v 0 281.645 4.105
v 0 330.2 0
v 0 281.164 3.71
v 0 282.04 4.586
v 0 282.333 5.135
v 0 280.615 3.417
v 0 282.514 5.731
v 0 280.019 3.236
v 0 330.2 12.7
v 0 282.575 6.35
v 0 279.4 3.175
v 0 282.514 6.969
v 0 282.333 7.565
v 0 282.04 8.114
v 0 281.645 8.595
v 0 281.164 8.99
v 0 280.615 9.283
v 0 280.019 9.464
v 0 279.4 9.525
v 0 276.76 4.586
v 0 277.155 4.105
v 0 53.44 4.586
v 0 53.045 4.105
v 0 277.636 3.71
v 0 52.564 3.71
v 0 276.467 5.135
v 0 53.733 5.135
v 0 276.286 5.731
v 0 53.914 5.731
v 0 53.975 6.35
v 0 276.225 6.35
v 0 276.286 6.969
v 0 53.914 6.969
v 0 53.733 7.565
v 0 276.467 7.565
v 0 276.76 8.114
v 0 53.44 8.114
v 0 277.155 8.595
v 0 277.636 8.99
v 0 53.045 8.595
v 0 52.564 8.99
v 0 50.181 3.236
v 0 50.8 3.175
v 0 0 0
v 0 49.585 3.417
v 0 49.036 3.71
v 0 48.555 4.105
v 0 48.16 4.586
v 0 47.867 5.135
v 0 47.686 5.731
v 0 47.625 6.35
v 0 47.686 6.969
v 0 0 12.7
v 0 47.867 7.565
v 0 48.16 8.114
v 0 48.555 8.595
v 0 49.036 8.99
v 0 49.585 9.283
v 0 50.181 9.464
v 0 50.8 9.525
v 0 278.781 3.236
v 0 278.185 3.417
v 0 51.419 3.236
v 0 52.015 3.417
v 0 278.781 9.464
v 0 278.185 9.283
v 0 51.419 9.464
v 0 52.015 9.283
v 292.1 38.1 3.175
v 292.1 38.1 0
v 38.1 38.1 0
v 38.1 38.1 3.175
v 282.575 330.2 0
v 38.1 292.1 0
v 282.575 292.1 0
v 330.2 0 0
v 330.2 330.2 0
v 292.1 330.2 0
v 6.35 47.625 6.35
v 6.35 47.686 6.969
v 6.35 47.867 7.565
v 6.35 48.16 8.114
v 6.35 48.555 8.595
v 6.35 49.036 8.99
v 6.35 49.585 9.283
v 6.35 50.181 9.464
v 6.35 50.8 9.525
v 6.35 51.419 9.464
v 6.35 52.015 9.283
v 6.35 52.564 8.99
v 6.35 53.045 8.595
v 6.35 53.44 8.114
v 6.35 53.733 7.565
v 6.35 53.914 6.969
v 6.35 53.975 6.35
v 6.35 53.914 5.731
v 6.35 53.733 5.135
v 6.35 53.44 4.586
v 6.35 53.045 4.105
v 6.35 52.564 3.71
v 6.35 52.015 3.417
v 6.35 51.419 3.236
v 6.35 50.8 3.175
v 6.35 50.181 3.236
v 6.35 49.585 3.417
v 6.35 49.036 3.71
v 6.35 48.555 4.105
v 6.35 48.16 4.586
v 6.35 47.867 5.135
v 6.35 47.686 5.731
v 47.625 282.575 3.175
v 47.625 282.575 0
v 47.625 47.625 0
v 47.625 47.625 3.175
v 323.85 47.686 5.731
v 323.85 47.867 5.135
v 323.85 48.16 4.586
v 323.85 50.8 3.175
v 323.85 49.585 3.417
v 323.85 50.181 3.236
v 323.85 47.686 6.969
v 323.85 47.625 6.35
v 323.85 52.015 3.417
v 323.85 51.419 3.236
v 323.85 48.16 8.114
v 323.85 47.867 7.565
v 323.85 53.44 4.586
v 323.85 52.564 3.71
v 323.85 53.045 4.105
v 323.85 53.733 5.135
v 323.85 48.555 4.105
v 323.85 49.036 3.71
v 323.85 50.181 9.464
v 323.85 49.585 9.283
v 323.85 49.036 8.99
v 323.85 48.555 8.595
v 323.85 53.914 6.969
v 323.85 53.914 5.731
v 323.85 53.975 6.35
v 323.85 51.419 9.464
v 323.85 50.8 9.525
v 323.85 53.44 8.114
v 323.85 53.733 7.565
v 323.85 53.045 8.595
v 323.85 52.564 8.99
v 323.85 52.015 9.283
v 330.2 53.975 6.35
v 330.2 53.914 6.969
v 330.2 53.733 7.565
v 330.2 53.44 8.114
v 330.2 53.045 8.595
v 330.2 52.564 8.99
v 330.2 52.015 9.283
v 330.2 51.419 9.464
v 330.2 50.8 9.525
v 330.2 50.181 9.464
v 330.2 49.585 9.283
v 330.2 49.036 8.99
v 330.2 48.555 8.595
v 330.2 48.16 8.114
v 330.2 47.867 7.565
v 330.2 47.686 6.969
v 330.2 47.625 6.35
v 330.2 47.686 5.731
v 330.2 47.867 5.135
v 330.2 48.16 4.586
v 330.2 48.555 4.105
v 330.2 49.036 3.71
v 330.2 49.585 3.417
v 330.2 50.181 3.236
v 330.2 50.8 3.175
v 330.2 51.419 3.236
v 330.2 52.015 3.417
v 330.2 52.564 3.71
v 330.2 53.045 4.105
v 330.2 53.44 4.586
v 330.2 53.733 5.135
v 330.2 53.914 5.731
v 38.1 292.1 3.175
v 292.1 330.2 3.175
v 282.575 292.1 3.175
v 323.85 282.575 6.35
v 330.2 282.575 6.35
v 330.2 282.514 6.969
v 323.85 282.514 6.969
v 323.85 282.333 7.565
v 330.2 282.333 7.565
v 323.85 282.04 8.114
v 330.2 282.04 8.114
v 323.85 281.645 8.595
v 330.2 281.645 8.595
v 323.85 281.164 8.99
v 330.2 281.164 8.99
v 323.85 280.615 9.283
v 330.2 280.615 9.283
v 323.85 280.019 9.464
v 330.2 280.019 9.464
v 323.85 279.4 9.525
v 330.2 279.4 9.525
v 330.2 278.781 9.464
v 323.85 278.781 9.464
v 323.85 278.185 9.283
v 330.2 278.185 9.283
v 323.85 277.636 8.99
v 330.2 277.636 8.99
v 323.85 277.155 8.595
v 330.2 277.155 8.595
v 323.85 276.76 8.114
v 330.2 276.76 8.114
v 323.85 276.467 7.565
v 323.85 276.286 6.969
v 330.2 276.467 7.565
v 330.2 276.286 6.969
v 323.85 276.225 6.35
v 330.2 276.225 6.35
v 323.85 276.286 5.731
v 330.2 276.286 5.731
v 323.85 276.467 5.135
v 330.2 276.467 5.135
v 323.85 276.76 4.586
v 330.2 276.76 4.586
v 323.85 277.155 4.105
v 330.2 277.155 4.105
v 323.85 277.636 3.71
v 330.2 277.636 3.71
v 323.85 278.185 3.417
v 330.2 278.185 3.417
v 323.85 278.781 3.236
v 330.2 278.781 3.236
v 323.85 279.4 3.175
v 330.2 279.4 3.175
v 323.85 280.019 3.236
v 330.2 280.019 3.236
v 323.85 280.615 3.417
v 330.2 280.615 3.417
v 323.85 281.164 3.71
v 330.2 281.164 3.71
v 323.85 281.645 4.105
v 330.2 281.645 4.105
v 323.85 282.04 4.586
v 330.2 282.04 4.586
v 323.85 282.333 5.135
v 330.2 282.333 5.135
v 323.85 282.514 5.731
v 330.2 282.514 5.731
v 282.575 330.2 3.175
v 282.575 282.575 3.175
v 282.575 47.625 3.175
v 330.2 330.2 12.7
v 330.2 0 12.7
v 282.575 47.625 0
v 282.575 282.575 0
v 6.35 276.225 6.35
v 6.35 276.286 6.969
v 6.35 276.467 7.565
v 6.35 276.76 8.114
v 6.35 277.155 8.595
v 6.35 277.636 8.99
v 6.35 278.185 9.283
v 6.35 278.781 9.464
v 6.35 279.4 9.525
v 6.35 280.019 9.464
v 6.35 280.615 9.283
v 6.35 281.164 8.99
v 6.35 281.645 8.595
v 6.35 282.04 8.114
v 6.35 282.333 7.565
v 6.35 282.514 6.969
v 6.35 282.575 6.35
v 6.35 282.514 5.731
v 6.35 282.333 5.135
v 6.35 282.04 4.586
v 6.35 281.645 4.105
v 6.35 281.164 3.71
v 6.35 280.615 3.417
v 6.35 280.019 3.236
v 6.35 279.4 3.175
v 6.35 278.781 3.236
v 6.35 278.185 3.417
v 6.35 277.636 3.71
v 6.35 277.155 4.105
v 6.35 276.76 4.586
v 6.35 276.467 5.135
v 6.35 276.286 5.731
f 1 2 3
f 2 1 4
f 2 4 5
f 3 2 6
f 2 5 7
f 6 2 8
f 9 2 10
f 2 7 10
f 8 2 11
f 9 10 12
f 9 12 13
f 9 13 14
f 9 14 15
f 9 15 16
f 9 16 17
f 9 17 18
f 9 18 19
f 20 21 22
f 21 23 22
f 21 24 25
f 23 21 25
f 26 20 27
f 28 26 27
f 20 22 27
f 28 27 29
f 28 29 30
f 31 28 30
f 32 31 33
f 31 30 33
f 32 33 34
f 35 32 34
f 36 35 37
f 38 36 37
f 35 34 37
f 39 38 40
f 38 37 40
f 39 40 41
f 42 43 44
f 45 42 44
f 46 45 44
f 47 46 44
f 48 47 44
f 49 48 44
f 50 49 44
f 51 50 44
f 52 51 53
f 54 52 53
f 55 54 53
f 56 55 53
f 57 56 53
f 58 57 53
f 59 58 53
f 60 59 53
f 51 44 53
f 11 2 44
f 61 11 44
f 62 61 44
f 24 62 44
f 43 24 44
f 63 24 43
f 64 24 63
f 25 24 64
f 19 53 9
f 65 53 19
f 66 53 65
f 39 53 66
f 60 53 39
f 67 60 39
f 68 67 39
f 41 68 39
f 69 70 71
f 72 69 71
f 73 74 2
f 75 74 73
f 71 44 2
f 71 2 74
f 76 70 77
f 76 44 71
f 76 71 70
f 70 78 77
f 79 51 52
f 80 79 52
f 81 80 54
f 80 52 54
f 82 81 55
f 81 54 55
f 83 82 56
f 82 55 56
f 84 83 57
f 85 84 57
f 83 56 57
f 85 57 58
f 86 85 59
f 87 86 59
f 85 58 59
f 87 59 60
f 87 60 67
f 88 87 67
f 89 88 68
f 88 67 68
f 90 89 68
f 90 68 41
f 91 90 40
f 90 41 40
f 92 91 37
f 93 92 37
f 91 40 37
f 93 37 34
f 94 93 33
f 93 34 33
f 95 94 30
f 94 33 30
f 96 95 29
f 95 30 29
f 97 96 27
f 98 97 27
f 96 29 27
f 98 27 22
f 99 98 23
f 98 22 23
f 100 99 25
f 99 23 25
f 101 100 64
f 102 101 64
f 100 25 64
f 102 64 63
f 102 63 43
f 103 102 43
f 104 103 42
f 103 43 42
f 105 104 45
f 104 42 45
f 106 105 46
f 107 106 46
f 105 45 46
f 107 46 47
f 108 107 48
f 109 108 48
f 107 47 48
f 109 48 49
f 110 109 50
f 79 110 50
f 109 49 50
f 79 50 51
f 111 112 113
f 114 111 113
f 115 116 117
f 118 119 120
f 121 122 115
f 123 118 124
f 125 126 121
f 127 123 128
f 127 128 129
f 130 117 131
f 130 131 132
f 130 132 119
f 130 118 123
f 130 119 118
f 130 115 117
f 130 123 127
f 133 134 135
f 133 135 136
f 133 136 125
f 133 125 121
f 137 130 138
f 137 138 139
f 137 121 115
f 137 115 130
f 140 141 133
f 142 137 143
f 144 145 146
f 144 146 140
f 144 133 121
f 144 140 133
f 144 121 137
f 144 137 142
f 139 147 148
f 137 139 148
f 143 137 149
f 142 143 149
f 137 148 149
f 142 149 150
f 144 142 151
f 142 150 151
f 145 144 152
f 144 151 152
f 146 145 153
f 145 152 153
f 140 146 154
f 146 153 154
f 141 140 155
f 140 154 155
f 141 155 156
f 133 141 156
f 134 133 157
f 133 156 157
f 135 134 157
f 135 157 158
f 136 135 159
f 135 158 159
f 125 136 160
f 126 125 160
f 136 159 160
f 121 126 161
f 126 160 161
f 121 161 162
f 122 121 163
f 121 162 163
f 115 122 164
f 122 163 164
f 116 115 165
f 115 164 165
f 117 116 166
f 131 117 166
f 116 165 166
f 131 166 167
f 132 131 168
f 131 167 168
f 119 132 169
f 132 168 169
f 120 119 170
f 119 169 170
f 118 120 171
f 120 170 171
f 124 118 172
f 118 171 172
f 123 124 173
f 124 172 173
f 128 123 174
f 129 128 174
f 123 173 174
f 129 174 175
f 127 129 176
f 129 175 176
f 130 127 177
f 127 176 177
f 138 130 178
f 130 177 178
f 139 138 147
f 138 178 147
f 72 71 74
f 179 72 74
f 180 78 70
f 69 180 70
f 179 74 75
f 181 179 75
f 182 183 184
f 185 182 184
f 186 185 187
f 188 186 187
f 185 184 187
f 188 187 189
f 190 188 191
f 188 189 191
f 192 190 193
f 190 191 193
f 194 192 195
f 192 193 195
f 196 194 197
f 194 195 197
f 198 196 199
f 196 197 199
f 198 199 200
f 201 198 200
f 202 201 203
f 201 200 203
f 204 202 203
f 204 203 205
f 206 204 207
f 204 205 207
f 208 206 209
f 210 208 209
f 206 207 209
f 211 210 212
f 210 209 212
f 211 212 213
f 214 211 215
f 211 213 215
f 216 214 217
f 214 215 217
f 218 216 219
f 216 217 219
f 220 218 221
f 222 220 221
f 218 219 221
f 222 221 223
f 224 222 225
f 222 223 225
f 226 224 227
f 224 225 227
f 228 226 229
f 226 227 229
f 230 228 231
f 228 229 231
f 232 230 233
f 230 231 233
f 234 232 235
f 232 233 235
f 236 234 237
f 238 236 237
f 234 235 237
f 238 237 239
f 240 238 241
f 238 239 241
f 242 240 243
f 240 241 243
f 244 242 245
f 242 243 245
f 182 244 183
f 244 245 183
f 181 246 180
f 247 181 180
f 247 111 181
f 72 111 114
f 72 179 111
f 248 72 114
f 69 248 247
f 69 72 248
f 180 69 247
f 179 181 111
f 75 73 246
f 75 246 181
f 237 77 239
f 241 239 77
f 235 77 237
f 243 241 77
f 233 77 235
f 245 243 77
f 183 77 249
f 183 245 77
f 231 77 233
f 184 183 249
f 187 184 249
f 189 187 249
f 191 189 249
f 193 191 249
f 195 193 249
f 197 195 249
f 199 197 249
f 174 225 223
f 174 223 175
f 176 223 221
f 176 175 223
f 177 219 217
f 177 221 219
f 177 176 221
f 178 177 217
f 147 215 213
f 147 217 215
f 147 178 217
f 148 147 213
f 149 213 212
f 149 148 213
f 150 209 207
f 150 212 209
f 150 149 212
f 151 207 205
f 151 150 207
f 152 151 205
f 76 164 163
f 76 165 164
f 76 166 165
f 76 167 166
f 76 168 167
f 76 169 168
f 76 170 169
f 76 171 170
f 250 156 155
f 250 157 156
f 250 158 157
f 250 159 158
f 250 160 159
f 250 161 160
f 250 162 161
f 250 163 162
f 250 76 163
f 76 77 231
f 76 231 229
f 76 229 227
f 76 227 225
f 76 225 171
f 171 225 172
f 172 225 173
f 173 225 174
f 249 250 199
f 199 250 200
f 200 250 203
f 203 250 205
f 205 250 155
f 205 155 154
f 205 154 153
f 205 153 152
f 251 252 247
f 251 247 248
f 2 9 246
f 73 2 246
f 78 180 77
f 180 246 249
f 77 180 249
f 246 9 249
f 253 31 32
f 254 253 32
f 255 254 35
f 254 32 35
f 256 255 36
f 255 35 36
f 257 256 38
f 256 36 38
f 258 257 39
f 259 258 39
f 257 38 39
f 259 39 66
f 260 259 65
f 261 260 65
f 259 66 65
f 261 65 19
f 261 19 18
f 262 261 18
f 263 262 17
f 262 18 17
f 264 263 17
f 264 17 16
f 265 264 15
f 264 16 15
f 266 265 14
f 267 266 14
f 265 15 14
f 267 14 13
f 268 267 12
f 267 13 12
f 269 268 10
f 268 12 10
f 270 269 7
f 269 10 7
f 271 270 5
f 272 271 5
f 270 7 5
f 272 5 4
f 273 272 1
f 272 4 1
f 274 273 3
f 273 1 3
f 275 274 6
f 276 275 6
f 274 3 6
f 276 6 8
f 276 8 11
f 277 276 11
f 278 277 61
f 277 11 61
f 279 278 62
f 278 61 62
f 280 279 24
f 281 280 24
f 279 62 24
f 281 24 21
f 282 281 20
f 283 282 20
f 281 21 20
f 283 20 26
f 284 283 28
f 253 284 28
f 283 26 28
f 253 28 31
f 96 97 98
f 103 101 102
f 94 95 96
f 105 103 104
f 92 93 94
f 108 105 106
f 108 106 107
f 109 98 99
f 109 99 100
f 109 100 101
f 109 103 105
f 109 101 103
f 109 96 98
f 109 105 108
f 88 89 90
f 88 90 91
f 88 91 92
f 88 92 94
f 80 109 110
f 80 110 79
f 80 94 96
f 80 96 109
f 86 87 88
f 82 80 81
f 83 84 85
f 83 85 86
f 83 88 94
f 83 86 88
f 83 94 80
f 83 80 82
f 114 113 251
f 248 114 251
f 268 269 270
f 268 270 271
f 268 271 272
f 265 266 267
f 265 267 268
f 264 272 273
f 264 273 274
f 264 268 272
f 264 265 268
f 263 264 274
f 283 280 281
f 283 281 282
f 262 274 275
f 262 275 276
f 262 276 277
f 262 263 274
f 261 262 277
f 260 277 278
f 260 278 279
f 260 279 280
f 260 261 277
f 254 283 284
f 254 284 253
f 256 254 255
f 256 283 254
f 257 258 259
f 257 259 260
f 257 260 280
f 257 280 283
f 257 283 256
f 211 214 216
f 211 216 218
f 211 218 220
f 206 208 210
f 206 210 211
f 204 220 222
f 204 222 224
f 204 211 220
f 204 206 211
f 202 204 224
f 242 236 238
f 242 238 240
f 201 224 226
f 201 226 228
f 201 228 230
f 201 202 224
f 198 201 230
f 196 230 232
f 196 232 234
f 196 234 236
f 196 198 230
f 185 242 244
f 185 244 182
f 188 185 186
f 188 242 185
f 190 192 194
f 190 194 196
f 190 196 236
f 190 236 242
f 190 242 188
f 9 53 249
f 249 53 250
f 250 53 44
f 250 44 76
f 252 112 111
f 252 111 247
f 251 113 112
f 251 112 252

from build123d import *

# Parameters (mm, degrees)
F0_W     = 330.2
F0_H     = 12.7
F1_DEPTH = 330.2
F2_W     = 9.525
F2_H     = 38.1
F2_W_2   = 234.95
F2_H_2   = 234.95
F3_DEPTH = 3.175
F4_R     = 3.175
F5_DEPTH = 6.35
F6_R     = 3.175
F7_DEPTH = 6.35


with BuildPart() as f1:
    # F0 (on Front) → F1 (new body)
    with BuildSketch(Plane.XZ):
        with Locations((165.1, 6.35)):
            Rectangle(F0_W, F0_H)
    extrude(amount=-F1_DEPTH)

    # F2 (on face) → F3 (cut)
    with BuildSketch(Plane(origin=(0, 0, 0), x_dir=(1, 0, 0), z_dir=(0, 0, -1))):
        with Locations((287.3375, -311.15)):
            Rectangle(F2_W, F2_H)
        Polygon((282.575, -292.1), (292.1, -292.1), (292.1, -38.1), (38.1, -38.1), (38.1, -292.1), align=None)
        with Locations((165.1, -165.1)):
            Rectangle(F2_W_2, F2_H_2, mode=Mode.SUBTRACT)
    extrude(amount=-F3_DEPTH, mode=Mode.SUBTRACT)

    # F4 (on face) → F5 (cut)
    with BuildSketch(Plane(origin=(0, 0, 0), x_dir=(0, -1, 0), z_dir=(-1, 0, 0))):
        with Locations((-279.4, 6.35)):
            Circle(F4_R)
        with Locations((-50.8, 6.35)):
            Circle(F4_R)
    extrude(amount=-F5_DEPTH, mode=Mode.SUBTRACT)

    # F6 (on face) → F7 (cut)
    with BuildSketch(Plane.YZ.offset(330.2)):
        with Locations((50.8, 6.35)):
            Circle(F6_R)
        with Locations((279.4, 6.35)):
            Circle(F6_R)
    extrude(amount=-F7_DEPTH, mode=Mode.SUBTRACT)


solid = f1.part
